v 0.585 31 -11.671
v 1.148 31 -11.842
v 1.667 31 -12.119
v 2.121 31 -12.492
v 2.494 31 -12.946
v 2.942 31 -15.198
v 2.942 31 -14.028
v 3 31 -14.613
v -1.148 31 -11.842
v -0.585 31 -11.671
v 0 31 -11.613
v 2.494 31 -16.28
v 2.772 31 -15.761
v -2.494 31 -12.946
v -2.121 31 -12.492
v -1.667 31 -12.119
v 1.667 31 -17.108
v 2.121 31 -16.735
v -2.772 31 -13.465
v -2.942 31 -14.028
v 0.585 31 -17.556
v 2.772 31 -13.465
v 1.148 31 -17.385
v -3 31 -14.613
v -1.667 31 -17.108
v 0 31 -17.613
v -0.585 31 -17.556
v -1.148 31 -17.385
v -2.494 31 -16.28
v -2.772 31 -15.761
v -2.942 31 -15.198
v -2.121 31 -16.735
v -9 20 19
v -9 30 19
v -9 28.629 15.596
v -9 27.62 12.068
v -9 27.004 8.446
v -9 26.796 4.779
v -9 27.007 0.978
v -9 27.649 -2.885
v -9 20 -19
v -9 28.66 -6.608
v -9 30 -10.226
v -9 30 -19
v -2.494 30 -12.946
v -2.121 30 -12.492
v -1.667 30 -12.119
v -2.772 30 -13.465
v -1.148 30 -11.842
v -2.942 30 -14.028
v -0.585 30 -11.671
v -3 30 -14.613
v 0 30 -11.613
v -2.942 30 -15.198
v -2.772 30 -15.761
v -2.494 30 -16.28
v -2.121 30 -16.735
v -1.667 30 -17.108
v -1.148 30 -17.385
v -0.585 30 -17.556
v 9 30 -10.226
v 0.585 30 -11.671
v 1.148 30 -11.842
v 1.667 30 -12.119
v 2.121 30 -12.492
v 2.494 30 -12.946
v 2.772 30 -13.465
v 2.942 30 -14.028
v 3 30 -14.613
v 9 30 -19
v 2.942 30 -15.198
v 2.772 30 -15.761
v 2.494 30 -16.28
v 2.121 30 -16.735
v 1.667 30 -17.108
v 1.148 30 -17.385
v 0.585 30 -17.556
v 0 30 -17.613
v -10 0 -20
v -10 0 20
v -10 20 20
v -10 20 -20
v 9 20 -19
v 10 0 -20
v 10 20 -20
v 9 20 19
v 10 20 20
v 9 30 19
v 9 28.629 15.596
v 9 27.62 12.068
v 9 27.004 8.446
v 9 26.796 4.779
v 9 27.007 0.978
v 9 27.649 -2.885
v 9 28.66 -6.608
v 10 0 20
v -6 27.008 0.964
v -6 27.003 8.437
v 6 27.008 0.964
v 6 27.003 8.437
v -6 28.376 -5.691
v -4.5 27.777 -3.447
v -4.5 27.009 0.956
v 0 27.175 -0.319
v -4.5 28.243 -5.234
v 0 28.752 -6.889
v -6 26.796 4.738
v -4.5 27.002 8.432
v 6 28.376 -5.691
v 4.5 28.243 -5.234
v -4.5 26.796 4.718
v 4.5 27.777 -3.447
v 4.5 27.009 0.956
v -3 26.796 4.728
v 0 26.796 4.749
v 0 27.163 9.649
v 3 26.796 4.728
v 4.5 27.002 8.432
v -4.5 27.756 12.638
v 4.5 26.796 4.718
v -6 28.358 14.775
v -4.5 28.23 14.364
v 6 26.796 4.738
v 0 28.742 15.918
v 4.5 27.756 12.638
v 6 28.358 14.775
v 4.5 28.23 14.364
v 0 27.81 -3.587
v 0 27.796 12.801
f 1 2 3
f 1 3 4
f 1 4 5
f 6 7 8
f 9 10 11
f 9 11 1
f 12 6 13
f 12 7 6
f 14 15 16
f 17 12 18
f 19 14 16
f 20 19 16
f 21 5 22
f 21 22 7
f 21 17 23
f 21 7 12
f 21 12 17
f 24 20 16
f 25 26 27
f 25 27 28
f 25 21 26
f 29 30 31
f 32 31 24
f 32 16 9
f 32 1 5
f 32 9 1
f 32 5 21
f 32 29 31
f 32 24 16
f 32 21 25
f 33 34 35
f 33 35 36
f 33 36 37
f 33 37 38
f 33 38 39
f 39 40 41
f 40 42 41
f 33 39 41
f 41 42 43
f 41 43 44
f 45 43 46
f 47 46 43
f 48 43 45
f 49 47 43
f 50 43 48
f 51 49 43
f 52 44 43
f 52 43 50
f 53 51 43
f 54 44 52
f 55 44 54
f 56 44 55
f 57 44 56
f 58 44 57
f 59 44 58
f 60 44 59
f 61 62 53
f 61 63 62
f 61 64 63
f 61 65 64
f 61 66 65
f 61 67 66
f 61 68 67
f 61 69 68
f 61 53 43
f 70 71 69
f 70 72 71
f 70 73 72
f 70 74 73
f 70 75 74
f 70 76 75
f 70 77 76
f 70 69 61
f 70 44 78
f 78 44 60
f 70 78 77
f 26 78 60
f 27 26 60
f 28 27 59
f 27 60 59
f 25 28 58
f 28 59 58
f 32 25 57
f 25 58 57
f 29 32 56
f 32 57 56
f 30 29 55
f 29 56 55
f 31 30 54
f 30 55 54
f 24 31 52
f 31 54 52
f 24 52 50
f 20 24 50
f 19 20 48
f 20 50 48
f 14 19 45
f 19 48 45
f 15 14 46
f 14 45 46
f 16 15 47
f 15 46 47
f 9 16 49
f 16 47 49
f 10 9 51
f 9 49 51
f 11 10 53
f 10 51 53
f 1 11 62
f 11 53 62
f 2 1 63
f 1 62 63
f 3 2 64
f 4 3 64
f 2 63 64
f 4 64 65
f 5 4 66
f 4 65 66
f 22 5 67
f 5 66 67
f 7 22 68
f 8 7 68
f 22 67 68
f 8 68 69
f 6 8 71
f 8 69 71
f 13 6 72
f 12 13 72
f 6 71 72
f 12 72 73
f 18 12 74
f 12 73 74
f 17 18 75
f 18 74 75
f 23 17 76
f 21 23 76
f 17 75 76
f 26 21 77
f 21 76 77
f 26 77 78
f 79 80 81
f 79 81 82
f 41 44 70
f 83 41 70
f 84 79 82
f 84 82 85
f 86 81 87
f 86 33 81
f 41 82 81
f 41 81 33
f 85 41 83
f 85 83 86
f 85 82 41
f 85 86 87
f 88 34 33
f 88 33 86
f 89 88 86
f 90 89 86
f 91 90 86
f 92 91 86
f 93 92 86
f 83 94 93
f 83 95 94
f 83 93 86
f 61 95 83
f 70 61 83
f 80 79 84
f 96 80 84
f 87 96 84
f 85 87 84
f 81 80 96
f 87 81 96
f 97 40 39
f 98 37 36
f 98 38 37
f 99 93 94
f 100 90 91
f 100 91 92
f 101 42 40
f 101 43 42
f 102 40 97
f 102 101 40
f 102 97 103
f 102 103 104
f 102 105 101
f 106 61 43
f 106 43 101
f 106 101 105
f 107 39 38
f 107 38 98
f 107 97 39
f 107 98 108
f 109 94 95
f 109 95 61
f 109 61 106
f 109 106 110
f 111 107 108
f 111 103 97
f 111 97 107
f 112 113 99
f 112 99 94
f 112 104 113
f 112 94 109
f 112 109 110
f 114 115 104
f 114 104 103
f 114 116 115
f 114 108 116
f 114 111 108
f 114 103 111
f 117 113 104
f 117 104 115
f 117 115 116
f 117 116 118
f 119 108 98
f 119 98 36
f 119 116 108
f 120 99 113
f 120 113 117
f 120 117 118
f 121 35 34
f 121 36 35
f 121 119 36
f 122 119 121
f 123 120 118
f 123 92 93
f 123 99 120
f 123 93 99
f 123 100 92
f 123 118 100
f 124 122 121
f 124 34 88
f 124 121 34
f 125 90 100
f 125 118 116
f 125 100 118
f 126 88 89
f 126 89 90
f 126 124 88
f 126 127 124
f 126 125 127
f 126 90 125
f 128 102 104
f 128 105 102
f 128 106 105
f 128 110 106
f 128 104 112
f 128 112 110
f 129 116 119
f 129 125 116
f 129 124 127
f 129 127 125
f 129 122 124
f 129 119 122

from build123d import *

# Parameters (mm, degrees)
CROQUIS1_W                 = 20
CROQUIS1_H                 = 40
SALIENTE_EXTRUIR1_DEPTH    = 30
CROQUIS2_W                 = 20
CROQUIS2_H                 = 40
CROQUIS2_W_2               = 18
CROQUIS2_H_2               = 38
CORTAR_EXTRUIR1_DEPTH      = 10
CORTAR_EXTRUIR2_DEPTH      = 41.755367745
CORTAR_EXTRUIR2_DEPTH_BACK = 41.755367745
CROQUIS4_R                 = 3
SALIENTE_EXTRUIR2_DEPTH    = 1


with BuildPart() as part:
    # Croquis1 → Saliente-Extruir1 (new body)
    with BuildSketch(Plane(origin=(0, 0, 0), x_dir=(1, 0, 0), z_dir=(0, 1, 0))):
        Rectangle(CROQUIS1_W, CROQUIS1_H)
    extrude(amount=SALIENTE_EXTRUIR1_DEPTH)

    # Croquis2 → Cortar-Extruir1 (cut)
    with BuildSketch(Plane(origin=(0, 30, 0), x_dir=(1, 0, 0), z_dir=(0, 1, 0))):
        Rectangle(CROQUIS2_W, CROQUIS2_H)
        Rectangle(CROQUIS2_W_2, CROQUIS2_H_2, mode=Mode.SUBTRACT)
    extrude(amount=-CORTAR_EXTRUIR1_DEPTH, mode=Mode.SUBTRACT)

    # Croquis3 → Cortar-Extruir2 (cut, two sides: drawn at the far end of the back side and taken through both)
    with BuildSketch(Plane.ZY.offset(9).offset(-CORTAR_EXTRUIR2_DEPTH_BACK)):
        with BuildLine():
            Line((19, 30), (-10.226390802, 30))
            add(Edge.make_bspline(
                [(-10.226390802, 30), (5.11136514, 23.592400747), (19, 30)],
                knots=[0, 0, 0, 1, 1, 1], degree=2))
        make_face()
    extrude(amount=CORTAR_EXTRUIR2_DEPTH + CORTAR_EXTRUIR2_DEPTH_BACK, mode=Mode.SUBTRACT)

    # Croquis4 → Saliente-Extruir2 (add)
    with BuildSketch(Plane(origin=(0, 30, 0), x_dir=(1, 0, 0), z_dir=(0, 1, 0))):
        with Locations(Location((0, 14.613195401, 0), (0, 0, 90))):
            Circle(CROQUIS4_R)
    extrude(amount=SALIENTE_EXTRUIR2_DEPTH)


solid = part.part
